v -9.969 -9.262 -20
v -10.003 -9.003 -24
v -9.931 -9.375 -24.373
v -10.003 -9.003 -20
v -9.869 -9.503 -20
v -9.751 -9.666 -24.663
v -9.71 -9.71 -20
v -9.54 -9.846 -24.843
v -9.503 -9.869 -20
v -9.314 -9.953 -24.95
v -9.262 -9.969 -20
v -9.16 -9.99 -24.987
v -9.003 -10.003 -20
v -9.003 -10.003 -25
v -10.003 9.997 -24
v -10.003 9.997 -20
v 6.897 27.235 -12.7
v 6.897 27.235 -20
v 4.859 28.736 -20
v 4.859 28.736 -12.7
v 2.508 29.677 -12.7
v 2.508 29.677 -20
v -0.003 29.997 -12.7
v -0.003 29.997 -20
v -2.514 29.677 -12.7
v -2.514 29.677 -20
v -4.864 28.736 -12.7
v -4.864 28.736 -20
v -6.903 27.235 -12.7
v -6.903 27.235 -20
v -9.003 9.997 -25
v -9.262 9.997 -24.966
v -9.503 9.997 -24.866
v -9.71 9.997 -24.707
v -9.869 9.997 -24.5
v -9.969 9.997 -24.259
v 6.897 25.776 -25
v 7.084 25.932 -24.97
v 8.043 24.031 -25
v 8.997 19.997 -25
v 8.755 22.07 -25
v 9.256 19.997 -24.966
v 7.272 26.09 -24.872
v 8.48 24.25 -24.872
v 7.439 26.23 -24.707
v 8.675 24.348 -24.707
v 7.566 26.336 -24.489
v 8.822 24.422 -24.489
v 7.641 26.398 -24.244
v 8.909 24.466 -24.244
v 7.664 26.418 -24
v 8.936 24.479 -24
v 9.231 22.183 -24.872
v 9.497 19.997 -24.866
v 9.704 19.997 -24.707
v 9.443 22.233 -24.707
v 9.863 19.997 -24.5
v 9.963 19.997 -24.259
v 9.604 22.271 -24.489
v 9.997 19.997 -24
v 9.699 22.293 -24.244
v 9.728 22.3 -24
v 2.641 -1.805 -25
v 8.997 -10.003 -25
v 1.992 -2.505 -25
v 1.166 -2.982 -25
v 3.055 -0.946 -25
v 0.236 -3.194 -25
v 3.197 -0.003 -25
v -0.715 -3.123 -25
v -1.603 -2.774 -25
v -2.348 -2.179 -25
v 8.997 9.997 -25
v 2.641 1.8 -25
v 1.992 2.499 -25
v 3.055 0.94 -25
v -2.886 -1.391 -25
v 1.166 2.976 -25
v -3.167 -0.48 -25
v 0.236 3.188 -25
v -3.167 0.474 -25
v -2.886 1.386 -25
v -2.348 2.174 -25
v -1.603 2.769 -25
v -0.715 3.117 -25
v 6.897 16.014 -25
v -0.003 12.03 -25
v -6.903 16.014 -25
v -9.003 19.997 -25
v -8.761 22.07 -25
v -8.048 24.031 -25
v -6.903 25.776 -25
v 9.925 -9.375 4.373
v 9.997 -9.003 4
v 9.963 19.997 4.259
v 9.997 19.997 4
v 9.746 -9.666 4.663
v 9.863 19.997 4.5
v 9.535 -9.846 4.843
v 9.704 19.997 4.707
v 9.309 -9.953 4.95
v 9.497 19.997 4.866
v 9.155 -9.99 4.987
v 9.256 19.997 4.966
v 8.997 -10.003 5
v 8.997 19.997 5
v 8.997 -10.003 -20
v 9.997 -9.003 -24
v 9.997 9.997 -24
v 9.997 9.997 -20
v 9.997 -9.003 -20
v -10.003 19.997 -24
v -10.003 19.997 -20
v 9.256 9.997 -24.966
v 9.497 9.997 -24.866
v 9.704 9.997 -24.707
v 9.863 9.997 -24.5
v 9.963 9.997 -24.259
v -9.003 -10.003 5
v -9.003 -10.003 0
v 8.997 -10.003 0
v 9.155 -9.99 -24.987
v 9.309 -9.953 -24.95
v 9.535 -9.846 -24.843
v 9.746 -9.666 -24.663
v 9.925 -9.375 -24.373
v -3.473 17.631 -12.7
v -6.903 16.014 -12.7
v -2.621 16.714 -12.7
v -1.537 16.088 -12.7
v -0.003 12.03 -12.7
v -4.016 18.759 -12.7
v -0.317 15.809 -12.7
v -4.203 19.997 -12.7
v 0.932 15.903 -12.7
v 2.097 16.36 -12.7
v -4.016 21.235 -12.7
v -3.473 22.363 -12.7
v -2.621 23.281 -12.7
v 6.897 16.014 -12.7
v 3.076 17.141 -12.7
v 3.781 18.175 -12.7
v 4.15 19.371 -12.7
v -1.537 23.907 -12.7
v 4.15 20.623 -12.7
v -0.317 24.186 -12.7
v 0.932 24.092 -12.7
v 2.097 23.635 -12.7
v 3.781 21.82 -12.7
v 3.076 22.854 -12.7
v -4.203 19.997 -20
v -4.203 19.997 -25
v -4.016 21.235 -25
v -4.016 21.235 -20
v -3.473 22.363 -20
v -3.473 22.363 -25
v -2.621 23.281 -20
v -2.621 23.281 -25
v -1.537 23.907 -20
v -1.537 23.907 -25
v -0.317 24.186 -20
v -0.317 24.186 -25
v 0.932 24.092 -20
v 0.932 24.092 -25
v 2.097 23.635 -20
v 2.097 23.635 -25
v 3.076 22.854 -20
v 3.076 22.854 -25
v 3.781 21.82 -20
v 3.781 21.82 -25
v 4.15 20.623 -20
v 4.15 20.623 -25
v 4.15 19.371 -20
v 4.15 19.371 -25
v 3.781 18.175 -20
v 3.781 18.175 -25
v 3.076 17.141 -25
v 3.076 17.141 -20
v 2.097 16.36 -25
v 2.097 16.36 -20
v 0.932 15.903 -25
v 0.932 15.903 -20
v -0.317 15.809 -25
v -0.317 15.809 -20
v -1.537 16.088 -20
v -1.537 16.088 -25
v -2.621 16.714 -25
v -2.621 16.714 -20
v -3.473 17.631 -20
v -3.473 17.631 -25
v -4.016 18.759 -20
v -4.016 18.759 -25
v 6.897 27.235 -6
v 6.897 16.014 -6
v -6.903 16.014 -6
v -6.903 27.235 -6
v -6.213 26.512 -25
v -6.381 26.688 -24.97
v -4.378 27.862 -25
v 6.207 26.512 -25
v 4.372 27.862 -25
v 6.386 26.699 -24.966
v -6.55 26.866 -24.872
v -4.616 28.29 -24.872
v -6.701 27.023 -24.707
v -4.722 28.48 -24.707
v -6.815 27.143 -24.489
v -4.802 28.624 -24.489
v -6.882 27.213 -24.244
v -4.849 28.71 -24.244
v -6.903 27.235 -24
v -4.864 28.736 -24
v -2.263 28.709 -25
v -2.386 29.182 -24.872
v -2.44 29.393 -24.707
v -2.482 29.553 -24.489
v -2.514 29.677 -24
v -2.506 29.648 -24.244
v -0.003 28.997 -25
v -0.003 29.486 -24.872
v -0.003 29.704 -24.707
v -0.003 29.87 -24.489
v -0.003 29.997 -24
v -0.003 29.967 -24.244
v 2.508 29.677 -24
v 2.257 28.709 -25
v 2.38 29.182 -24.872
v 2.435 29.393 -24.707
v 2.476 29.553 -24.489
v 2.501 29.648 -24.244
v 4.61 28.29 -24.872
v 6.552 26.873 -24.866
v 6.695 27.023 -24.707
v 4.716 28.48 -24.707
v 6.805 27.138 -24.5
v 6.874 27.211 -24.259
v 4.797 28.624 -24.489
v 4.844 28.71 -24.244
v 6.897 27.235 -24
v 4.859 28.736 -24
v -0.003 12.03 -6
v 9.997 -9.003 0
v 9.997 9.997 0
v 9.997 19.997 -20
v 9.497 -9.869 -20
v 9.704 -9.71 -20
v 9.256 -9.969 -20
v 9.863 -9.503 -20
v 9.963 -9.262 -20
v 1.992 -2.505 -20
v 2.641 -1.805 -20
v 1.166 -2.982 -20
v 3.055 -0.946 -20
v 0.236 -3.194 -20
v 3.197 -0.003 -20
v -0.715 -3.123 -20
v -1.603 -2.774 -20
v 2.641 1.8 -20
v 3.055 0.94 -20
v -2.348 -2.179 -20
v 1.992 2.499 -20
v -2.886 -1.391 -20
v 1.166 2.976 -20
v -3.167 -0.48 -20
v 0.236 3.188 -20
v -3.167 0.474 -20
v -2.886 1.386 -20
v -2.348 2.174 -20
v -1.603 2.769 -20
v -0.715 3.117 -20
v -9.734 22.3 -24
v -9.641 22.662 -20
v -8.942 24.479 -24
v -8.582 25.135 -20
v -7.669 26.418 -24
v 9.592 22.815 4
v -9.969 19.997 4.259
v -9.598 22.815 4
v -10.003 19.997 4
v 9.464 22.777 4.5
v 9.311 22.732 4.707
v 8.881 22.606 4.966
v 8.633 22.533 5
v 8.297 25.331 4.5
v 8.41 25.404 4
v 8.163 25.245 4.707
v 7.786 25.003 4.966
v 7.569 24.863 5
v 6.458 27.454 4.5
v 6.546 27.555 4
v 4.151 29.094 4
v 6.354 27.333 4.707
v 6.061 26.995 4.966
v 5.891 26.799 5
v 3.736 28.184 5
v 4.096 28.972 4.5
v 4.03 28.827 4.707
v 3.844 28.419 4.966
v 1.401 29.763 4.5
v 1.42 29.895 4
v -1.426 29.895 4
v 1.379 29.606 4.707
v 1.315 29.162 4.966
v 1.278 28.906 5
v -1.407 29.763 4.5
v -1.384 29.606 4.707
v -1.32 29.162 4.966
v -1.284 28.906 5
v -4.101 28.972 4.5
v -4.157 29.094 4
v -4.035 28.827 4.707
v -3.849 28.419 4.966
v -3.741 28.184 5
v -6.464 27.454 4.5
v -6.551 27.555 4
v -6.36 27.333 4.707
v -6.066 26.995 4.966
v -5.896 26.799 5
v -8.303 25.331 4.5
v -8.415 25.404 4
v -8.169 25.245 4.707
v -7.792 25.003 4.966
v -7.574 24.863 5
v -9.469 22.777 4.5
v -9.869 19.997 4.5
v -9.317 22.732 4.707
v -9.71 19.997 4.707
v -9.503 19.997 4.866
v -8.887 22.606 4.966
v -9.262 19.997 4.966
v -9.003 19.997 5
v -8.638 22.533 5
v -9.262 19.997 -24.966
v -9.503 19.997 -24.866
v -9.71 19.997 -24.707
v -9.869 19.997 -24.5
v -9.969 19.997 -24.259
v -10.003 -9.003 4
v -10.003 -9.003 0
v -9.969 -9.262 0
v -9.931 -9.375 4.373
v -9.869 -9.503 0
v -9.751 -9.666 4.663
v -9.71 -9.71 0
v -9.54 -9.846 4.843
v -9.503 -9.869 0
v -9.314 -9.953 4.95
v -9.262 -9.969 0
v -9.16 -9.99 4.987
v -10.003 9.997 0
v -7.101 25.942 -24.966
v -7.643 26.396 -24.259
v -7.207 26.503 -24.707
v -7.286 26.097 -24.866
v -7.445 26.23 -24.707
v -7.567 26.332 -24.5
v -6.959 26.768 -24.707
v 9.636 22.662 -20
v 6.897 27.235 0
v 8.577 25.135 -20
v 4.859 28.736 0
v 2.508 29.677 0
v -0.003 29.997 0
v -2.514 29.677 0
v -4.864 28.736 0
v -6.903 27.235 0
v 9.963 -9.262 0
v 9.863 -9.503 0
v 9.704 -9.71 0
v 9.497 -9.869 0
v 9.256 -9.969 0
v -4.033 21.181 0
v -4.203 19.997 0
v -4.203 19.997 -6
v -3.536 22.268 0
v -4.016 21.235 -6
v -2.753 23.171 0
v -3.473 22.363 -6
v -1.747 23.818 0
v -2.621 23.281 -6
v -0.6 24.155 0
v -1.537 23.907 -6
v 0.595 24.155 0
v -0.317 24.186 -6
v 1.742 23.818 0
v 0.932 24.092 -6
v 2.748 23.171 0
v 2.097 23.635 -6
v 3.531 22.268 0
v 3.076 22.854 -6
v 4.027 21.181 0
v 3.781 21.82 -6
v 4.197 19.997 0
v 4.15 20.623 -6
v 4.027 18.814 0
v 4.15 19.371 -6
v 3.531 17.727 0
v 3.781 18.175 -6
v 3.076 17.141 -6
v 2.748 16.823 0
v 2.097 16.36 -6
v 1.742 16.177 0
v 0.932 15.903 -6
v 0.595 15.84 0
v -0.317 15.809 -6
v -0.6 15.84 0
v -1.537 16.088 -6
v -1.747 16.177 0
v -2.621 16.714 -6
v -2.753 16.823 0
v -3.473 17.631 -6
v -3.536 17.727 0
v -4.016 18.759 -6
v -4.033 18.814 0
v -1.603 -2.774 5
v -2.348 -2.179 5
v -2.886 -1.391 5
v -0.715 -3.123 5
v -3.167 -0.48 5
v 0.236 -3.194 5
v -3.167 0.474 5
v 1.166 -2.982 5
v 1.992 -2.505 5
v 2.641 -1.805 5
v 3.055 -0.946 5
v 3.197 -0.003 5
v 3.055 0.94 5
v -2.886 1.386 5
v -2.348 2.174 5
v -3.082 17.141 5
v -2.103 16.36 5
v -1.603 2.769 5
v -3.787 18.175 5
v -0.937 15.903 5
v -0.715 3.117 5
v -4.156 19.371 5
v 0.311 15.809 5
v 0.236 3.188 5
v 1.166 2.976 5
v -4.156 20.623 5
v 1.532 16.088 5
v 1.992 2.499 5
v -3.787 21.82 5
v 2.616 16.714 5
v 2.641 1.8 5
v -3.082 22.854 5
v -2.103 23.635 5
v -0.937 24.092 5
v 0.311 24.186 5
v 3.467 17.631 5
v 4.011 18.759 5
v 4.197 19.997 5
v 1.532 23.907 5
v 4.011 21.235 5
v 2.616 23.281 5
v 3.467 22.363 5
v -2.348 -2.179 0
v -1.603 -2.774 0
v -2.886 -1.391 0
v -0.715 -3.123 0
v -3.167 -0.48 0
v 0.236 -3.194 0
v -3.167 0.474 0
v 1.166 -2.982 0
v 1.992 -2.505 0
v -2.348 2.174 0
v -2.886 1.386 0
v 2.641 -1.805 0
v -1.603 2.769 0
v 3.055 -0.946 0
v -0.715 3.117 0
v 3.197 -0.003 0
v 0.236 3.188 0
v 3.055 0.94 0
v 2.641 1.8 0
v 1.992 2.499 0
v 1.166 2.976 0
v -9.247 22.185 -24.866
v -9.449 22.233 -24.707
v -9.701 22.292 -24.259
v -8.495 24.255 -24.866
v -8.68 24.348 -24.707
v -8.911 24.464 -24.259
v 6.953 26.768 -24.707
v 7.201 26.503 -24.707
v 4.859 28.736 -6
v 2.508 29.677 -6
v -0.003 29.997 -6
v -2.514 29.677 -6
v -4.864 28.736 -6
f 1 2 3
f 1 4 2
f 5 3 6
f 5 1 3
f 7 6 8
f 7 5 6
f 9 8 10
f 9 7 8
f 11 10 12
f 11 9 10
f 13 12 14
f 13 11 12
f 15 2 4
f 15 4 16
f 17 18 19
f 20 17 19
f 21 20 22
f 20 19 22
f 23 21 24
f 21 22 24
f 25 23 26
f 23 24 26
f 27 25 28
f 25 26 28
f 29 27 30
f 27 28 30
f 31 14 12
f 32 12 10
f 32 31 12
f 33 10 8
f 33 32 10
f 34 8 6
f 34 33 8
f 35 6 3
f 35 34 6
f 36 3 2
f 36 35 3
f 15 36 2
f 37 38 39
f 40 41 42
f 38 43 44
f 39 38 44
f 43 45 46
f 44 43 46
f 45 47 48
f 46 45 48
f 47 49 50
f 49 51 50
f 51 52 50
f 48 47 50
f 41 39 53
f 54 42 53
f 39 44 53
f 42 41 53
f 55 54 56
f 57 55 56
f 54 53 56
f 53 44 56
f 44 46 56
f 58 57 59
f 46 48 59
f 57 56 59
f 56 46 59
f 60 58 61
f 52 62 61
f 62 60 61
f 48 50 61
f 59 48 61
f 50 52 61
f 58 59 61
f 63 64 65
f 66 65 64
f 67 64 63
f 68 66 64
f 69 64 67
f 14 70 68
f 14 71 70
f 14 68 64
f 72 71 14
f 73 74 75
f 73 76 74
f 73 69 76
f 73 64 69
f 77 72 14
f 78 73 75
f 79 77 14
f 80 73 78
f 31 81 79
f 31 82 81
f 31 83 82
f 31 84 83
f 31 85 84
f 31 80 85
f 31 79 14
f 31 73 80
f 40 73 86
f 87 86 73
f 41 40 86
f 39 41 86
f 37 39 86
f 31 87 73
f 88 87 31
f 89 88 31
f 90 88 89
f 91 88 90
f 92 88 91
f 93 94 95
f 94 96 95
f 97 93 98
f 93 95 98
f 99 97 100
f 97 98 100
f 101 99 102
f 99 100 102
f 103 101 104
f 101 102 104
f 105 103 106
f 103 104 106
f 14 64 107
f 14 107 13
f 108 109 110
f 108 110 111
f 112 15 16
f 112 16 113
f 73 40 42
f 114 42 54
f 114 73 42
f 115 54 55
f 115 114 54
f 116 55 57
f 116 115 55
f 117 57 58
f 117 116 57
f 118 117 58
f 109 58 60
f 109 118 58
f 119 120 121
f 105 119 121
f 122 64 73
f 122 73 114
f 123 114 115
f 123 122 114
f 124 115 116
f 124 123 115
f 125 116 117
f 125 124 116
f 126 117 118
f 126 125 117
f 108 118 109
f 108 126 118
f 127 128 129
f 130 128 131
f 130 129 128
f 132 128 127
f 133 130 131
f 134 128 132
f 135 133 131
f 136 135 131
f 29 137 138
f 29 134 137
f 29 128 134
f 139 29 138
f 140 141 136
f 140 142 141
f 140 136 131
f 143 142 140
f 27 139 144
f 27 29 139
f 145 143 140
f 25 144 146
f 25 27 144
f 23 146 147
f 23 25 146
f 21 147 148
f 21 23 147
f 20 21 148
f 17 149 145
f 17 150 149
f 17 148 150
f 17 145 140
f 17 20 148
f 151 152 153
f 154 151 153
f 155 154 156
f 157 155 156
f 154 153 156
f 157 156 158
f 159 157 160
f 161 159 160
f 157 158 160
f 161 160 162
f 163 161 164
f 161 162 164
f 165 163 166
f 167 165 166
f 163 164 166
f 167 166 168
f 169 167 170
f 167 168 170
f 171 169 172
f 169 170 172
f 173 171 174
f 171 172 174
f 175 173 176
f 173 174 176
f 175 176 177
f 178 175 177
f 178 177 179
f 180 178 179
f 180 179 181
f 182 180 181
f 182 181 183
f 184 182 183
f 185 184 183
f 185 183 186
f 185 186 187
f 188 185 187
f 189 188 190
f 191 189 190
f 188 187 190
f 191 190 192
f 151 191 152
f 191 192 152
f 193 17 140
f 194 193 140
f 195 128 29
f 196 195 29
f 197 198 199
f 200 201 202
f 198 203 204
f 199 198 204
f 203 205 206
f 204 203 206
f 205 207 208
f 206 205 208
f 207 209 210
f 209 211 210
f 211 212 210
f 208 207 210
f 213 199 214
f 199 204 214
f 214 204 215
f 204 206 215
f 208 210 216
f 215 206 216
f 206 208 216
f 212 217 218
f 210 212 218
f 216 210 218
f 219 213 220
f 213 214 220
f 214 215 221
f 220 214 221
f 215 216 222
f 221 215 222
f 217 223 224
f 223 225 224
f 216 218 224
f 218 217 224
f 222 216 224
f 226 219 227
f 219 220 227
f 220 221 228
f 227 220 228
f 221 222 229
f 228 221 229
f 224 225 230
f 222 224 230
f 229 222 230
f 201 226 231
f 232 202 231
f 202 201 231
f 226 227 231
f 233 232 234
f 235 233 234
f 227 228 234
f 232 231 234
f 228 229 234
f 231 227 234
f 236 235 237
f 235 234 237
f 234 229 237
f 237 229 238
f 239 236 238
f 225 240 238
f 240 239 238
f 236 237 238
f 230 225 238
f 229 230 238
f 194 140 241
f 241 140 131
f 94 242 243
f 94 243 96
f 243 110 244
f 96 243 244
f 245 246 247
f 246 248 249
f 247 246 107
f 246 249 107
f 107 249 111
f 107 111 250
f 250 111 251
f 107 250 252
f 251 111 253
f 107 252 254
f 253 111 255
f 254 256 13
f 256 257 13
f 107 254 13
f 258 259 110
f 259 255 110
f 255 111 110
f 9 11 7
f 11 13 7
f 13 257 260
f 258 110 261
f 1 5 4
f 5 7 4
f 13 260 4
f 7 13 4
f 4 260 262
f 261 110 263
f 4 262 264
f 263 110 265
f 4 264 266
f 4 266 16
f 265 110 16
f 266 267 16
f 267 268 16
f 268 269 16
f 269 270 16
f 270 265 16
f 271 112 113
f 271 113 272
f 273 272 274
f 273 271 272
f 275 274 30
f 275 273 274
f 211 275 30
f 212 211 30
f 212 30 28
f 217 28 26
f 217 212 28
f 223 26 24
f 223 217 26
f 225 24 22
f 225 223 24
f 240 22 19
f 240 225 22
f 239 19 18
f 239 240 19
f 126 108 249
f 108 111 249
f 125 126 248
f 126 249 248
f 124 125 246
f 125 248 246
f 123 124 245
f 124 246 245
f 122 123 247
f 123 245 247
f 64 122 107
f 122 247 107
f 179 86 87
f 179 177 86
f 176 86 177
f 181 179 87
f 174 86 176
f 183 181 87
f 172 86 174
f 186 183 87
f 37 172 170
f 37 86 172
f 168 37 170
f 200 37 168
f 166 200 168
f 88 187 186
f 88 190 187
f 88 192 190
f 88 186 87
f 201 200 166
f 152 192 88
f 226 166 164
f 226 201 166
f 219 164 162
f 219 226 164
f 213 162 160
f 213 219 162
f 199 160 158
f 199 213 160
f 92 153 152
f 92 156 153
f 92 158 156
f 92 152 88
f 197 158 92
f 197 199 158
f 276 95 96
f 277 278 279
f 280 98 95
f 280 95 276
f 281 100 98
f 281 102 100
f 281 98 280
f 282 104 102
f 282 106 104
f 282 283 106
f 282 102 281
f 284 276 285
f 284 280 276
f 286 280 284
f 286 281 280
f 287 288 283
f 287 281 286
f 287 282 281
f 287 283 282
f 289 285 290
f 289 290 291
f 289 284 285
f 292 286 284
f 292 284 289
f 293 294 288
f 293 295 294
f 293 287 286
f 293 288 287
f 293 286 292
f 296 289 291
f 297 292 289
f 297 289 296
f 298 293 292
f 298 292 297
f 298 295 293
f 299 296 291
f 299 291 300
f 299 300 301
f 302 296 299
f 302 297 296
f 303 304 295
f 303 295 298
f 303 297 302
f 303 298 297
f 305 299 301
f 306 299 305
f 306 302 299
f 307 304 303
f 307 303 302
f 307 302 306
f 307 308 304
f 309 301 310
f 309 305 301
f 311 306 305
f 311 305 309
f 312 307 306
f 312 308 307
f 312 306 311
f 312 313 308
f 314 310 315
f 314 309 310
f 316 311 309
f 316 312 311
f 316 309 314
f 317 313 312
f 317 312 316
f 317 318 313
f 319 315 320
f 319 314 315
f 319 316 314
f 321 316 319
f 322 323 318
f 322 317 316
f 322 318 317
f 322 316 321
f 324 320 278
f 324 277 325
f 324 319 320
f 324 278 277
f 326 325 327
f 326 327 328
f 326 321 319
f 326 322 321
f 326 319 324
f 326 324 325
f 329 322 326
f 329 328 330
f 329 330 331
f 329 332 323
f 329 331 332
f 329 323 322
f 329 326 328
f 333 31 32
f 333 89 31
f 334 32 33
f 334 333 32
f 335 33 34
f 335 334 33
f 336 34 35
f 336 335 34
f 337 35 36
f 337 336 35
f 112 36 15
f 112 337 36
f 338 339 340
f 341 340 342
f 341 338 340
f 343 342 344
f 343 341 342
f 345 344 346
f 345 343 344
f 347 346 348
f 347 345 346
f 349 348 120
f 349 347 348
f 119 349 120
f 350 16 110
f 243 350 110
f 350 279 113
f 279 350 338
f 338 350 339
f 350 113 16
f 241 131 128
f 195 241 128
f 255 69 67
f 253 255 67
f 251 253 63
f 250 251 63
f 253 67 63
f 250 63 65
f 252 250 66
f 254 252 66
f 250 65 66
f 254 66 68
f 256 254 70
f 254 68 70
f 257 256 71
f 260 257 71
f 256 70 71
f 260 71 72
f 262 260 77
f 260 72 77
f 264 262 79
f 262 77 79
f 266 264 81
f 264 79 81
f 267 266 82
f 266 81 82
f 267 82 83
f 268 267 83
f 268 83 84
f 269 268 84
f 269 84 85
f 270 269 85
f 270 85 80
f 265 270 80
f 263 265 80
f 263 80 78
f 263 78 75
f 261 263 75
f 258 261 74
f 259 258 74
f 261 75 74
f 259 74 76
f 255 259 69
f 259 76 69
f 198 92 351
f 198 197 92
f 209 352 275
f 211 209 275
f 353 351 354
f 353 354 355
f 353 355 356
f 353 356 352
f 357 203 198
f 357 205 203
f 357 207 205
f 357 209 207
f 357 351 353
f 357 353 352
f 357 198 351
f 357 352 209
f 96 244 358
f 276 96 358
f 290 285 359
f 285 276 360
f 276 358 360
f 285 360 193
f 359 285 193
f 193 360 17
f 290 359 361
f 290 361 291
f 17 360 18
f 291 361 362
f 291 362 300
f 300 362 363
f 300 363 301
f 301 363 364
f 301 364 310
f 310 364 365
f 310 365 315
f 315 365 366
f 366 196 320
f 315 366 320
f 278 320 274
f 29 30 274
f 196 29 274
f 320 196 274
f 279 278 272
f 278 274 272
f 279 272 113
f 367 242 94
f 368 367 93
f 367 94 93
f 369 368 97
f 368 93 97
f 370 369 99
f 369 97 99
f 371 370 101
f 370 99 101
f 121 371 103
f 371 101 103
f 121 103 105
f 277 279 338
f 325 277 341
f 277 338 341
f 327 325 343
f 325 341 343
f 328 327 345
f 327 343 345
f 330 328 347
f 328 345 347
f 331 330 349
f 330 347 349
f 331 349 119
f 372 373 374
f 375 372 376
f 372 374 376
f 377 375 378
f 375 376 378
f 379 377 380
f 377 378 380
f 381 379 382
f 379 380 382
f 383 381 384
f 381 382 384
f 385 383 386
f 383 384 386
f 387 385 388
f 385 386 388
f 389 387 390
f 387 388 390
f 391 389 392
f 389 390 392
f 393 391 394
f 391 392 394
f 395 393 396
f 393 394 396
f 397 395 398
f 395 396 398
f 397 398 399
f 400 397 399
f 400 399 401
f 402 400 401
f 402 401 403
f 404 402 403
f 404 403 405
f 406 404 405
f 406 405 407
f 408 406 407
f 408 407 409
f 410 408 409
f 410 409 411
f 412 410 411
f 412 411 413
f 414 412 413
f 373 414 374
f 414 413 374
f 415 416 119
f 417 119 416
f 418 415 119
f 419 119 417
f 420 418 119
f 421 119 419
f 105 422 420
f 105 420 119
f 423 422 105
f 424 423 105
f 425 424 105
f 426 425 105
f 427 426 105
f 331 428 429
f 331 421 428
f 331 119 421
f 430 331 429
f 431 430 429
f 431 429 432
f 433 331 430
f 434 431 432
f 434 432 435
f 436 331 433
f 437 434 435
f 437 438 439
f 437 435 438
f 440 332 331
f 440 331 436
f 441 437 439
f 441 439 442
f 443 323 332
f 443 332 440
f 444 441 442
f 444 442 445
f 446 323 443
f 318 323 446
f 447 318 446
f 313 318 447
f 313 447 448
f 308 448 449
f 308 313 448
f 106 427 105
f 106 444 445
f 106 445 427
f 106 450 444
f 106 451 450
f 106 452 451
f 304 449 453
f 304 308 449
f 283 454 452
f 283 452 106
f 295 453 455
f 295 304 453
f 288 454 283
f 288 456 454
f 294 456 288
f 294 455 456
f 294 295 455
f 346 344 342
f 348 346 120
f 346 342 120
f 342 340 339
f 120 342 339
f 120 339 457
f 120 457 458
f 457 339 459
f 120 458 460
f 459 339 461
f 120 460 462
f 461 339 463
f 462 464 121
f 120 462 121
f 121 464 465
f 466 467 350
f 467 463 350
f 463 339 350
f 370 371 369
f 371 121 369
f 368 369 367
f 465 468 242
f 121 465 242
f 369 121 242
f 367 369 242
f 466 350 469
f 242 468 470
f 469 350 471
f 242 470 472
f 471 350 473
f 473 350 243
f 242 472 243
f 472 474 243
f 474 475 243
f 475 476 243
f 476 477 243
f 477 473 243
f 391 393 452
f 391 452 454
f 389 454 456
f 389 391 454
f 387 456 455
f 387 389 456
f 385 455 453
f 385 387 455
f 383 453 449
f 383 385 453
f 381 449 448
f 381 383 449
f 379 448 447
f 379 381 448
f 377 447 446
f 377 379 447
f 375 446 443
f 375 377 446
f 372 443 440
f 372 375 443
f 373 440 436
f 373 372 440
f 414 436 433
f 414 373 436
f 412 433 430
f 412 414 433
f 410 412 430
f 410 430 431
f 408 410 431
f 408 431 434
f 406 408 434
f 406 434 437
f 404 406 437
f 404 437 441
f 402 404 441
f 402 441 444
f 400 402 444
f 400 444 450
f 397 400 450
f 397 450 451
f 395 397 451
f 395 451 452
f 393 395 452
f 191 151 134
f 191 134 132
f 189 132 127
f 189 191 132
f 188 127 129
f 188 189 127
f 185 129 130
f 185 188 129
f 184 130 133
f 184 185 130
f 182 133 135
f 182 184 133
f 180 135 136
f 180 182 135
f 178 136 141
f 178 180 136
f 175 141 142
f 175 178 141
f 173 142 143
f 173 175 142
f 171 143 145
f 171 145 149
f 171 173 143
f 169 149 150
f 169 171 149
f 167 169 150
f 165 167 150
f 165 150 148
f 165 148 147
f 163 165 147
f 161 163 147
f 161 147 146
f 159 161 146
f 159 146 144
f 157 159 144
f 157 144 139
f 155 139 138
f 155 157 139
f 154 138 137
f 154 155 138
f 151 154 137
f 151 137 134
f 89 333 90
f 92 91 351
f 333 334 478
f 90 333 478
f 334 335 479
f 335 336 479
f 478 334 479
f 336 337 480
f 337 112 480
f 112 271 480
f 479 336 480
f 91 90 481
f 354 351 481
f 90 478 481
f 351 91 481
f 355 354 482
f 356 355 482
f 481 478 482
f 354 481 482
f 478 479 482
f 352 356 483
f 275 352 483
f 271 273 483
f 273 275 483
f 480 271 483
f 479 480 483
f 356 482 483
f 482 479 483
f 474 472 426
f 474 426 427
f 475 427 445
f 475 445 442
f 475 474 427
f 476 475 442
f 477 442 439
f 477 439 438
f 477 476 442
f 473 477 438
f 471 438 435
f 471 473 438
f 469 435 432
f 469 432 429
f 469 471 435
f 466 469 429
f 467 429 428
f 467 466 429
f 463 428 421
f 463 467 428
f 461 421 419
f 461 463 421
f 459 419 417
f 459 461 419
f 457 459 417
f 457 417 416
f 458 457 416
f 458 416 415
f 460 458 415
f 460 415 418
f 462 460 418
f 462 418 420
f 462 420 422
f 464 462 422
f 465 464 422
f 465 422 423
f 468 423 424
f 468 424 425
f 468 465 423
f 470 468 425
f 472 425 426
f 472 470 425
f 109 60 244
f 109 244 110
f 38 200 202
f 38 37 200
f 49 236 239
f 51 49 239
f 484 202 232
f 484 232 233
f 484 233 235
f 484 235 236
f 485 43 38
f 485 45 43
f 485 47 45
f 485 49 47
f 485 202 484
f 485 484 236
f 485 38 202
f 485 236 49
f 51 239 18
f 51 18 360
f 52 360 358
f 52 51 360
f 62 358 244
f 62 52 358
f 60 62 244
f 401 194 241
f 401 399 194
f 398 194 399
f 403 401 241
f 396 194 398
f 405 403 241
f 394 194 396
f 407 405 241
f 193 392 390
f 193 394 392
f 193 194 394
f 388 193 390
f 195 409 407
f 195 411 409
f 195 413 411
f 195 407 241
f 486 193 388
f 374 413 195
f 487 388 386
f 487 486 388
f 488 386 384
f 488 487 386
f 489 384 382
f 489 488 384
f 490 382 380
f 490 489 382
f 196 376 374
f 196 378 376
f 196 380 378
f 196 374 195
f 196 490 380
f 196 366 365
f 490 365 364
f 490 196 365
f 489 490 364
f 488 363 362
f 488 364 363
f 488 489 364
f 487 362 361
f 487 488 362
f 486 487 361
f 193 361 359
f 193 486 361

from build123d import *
from build123d.topology import SkipClean

# Parameters (mm, degrees)
SKETCH2_R           = 4.200000000000002
SKETCH2_R_2         = 3.2
BOSS_EXTRUDE2_DEPTH = 5
BOSS_EXTRUDE3_START = 20
BOSS_EXTRUDE3_DEPTH = 20
BOSS_EXTRUDE4_START = 6
SKETCH4_R           = 4.200000000000002
BOSS_EXTRUDE4_DEPTH = 6
BOSS_EXTRUDE5_START = 5
SKETCH5_R           = 3.2000000000000006
SKETCH5_R_2         = 4.200000000000001
BOSS_EXTRUDE5_DEPTH = 5
SKETCH6_R           = 4.200000000000002
BOSS_EXTRUDE6_DEPTH = 7.3
FILLET1_R           = 1


with BuildPart() as part:
    # Sketch2 → Boss-Extrude2 (new body)
    with BuildSketch(Plane.XY):
        with BuildLine():
            Line((-10.002730808209856, -10.002730808209863), (9.997269191790144, -10.002730808209856))
            Line((9.997269191790144, -10.002730808209856), (9.997269191790144, 19.99726919179014))
            ThreePointArc((9.997269191790144, 19.99726919179014), (-0.00273080820985792, 29.99726919179014), (-10.002730808209856, 19.997269191790135))
            Line((-10.002730808209856, 19.997269191790135), (-10.002730808209856, -10.002730808209863))
        make_face()
        with Locations((-0.00273080820985608, 19.99726919179014)):
            Circle(SKETCH2_R, mode=Mode.SUBTRACT)
        with Locations((-0.00273080820986128, -0.00273080820986128)):
            Circle(SKETCH2_R_2, mode=Mode.SUBTRACT)
    extrude(amount=BOSS_EXTRUDE2_DEPTH)

    # Sketch3 → Boss-Extrude3 (add)
    with BuildSketch(Plane(origin=(0, 0, 0), x_dir=(-1, 0, 0), z_dir=(0, 0, -1)).offset(BOSS_EXTRUDE3_START)):
        with BuildLine():
            Line((6.9027308082098555, 19.298146779896605), (6.9027308082098555, 27.235362863469167))
            ThreePointArc((6.9027308082098555, 27.235362863469167), (9.195118963634973, 23.934273128796043), (10.002730808209856, 19.99726919179014))
            Line((10.002730808209856, 19.99726919179014), (10.002730808209868, 9.997269191790137))
            Line((10.002730808209868, 9.997269191790137), (-9.997269191790144, 9.997269191790139))
            Line((-9.997269191790144, 9.997269191790139), (-9.997269191790146, 19.99726919179014))
            ThreePointArc((-9.997269191790146, 19.99726919179014), (-9.189657347215263, 23.934273128796043), (-6.897269191790147, 27.235362863469163))
            Line((-6.897269191790147, 27.235362863469163), (-6.897269191790146, 21.118127792576228))
            Line((-6.897269191790146, 21.118127792576228), (-6.897269191790146, 16.01355233438172))
            Line((-6.897269191790146, 16.01355233438172), (0.00273080820985521, 12.029835476973302))
            Line((0.00273080820985521, 12.029835476973302), (6.9027308082098555, 16.013552334381725))
            Line((6.9027308082098555, 16.013552334381725), (6.9027308082098555, 19.298146779896605))
        make_face()
    extrude(amount=-BOSS_EXTRUDE3_DEPTH)

    # Sketch4 → Boss-Extrude4 (add)
    with SkipClean():  # the faces are left unmerged after this step: merging them gives an invalid solid
        with BuildSketch(Plane(origin=(0, 0, 0), x_dir=(-1, 0, 0), z_dir=(0, 0, -1)).offset(BOSS_EXTRUDE4_START)):
            with BuildLine():
                Line((6.9027308082098555, 16.013552334381725), (6.902730808209854, 27.235362863469167))
                ThreePointArc((6.902730808209854, 27.235362863469167), (0.00273080820985225, 29.99726919179014), (-6.897269191790148, 27.235362863469163))
                Line((-6.897269191790148, 27.235362863469163), (-6.897269191790146, 16.01355233438172))
                Line((-6.897269191790146, 16.01355233438172), (0.00273080820985521, 12.029835476973302))
                Line((0.00273080820985521, 12.029835476973302), (6.9027308082098555, 16.013552334381725))
            make_face()
            with Locations((0.00273080820985608, 19.99726919179014)):
                Circle(SKETCH4_R, mode=Mode.SUBTRACT)
        extrude(amount=-BOSS_EXTRUDE4_DEPTH)

    # Sketch5 → Boss-Extrude5 (add)
    # profile 1 of 3: a face of its own
    with SkipClean():  # the faces are left unmerged after this step: merging them gives an invalid solid
        with BuildSketch(Plane(origin=(0, 0, -20), x_dir=(-1, 0, 0), z_dir=(0, 0, -1)).offset(BOSS_EXTRUDE5_START)):
            with BuildLine():
                Line((6.9027308082098555, 16.013552334381725), (0.00273080820985521, 12.029835476973302))
                Line((0.00273080820985521, 12.029835476973302), (-6.897269191790146, 16.01355233438172))
                Line((-6.897269191790146, 16.01355233438172), (-6.897269191790149, 27.235362863469163))
                ThreePointArc((-6.897269191790149, 27.235362863469163), (-9.189657347215263, 23.934273128796043), (-9.997269191790146, 19.99726919179014))
                Line((-9.997269191790146, 19.99726919179014), (-9.997269191790144, 9.997269191790139))
                Line((-9.997269191790144, 9.997269191790139), (10.002730808209868, 9.997269191790137))
                Line((10.002730808209868, 9.997269191790137), (10.002730808209856, 19.99726919179014))
                ThreePointArc((10.002730808209856, 19.99726919179014), (9.195118963634973, 23.934273128796043), (6.9027308082098555, 27.235362863469167))
                Line((6.9027308082098555, 27.235362863469167), (6.9027308082098555, 16.013552334381725))
            make_face()
        # profile 2 of 3: a face of its own
        with BuildSketch(Plane(origin=(0, 0, -20), x_dir=(-1, 0, 0), z_dir=(0, 0, -1)).offset(BOSS_EXTRUDE5_START)):
            Polygon((10.00273080820987, 9.997269191790137), (-9.997269191790144, 9.997269191790139), (-9.997269191790142, -10.002730808209861), (10.002730808209861, -10.002730808209861), align=None)
            with Locations(Location((0.00273080820986128, -0.00273080820986128, 0), (0, 0, 180))):
                Circle(SKETCH5_R, mode=Mode.SUBTRACT)
        # profile 3 of 3: a face of its own
        with BuildSketch(Plane(origin=(0, 0, -20), x_dir=(-1, 0, 0), z_dir=(0, 0, -1)).offset(BOSS_EXTRUDE5_START)):
            with BuildLine():
                ThreePointArc((6.902730808209858, 27.235362863469167), (0.00273080820985499, 29.99726919179014), (-6.897269191790148, 27.235362863469163))
                Line((-6.897269191790149, 27.235362863469163), (-6.897269191790146, 16.01355233438172))
                Line((-6.897269191790146, 16.01355233438172), (0.00273080820985521, 12.029835476973302))
                Line((0.00273080820985516, 12.029835476973302), (6.9027308082098555, 16.013552334381725))
                Line((6.9027308082098555, 16.013552334381725), (6.9027308082098555, 27.235362863469167))
            make_face()
            with Locations((0.00273080820985608, 19.99726919179014)):
                Circle(SKETCH5_R_2, mode=Mode.SUBTRACT)
        extrude(amount=-BOSS_EXTRUDE5_DEPTH)

    # Sketch6 → Boss-Extrude6 (add)
    with SkipClean():  # the faces are left unmerged after this step: merging them gives an invalid solid
        with BuildSketch(Plane.XY.offset(-20)):
            with BuildLine():
                Line((-0.00273080820985521, 12.029835476973302), (6.897269191790146, 16.01355233438172))
                Line((6.897269191790146, 16.01355233438172), (6.897269191790149, 27.235362863469163))
                ThreePointArc((6.897269191790149, 27.235362863469163), (-0.00273080820985102, 29.99726919179014), (-6.9027308082098555, 27.23536286346917))
                Line((-6.9027308082098555, 27.23536286346917), (-6.9027308082098555, 16.013552334381725))
                Line((-6.9027308082098555, 16.013552334381725), (-0.00273080820985521, 12.029835476973302))
            make_face()
            with Locations(Location((-0.00273080820985608, 19.99726919179014, 0), (0, 0, 180))):
                Circle(SKETCH6_R, mode=Mode.SUBTRACT)
        extrude(amount=BOSS_EXTRUDE6_DEPTH)

    # Fillet1
    fillet1_edges = [part.edges().sort_by_distance(p)[0] for p in [
        (9.997269191790144, 4.99726919179014, 5),
        (-0.00273080820985721, 29.99726919179014, 5),
        (-10.002730808209856, 4.997269191790135, 5),
        (-10.002730808209861, -10.002730808209861, -22.5),
        (9.997269191790142, -10.002730808209861, -22.5),
        (-10.002730808209858, 4.997269191790139, -25),
        (-0.00273080820987453, 29.99726919179015, -25),
        (9.997269191790144, 4.997269191790139, -25),
        (9.997269191790144, -10.002730808209856, 2.5),
        (-10.002730808209856, -10.002730808209863, 2.5),
    ]]
    fillet(fillet1_edges, radius=FILLET1_R)


solid = part.part
